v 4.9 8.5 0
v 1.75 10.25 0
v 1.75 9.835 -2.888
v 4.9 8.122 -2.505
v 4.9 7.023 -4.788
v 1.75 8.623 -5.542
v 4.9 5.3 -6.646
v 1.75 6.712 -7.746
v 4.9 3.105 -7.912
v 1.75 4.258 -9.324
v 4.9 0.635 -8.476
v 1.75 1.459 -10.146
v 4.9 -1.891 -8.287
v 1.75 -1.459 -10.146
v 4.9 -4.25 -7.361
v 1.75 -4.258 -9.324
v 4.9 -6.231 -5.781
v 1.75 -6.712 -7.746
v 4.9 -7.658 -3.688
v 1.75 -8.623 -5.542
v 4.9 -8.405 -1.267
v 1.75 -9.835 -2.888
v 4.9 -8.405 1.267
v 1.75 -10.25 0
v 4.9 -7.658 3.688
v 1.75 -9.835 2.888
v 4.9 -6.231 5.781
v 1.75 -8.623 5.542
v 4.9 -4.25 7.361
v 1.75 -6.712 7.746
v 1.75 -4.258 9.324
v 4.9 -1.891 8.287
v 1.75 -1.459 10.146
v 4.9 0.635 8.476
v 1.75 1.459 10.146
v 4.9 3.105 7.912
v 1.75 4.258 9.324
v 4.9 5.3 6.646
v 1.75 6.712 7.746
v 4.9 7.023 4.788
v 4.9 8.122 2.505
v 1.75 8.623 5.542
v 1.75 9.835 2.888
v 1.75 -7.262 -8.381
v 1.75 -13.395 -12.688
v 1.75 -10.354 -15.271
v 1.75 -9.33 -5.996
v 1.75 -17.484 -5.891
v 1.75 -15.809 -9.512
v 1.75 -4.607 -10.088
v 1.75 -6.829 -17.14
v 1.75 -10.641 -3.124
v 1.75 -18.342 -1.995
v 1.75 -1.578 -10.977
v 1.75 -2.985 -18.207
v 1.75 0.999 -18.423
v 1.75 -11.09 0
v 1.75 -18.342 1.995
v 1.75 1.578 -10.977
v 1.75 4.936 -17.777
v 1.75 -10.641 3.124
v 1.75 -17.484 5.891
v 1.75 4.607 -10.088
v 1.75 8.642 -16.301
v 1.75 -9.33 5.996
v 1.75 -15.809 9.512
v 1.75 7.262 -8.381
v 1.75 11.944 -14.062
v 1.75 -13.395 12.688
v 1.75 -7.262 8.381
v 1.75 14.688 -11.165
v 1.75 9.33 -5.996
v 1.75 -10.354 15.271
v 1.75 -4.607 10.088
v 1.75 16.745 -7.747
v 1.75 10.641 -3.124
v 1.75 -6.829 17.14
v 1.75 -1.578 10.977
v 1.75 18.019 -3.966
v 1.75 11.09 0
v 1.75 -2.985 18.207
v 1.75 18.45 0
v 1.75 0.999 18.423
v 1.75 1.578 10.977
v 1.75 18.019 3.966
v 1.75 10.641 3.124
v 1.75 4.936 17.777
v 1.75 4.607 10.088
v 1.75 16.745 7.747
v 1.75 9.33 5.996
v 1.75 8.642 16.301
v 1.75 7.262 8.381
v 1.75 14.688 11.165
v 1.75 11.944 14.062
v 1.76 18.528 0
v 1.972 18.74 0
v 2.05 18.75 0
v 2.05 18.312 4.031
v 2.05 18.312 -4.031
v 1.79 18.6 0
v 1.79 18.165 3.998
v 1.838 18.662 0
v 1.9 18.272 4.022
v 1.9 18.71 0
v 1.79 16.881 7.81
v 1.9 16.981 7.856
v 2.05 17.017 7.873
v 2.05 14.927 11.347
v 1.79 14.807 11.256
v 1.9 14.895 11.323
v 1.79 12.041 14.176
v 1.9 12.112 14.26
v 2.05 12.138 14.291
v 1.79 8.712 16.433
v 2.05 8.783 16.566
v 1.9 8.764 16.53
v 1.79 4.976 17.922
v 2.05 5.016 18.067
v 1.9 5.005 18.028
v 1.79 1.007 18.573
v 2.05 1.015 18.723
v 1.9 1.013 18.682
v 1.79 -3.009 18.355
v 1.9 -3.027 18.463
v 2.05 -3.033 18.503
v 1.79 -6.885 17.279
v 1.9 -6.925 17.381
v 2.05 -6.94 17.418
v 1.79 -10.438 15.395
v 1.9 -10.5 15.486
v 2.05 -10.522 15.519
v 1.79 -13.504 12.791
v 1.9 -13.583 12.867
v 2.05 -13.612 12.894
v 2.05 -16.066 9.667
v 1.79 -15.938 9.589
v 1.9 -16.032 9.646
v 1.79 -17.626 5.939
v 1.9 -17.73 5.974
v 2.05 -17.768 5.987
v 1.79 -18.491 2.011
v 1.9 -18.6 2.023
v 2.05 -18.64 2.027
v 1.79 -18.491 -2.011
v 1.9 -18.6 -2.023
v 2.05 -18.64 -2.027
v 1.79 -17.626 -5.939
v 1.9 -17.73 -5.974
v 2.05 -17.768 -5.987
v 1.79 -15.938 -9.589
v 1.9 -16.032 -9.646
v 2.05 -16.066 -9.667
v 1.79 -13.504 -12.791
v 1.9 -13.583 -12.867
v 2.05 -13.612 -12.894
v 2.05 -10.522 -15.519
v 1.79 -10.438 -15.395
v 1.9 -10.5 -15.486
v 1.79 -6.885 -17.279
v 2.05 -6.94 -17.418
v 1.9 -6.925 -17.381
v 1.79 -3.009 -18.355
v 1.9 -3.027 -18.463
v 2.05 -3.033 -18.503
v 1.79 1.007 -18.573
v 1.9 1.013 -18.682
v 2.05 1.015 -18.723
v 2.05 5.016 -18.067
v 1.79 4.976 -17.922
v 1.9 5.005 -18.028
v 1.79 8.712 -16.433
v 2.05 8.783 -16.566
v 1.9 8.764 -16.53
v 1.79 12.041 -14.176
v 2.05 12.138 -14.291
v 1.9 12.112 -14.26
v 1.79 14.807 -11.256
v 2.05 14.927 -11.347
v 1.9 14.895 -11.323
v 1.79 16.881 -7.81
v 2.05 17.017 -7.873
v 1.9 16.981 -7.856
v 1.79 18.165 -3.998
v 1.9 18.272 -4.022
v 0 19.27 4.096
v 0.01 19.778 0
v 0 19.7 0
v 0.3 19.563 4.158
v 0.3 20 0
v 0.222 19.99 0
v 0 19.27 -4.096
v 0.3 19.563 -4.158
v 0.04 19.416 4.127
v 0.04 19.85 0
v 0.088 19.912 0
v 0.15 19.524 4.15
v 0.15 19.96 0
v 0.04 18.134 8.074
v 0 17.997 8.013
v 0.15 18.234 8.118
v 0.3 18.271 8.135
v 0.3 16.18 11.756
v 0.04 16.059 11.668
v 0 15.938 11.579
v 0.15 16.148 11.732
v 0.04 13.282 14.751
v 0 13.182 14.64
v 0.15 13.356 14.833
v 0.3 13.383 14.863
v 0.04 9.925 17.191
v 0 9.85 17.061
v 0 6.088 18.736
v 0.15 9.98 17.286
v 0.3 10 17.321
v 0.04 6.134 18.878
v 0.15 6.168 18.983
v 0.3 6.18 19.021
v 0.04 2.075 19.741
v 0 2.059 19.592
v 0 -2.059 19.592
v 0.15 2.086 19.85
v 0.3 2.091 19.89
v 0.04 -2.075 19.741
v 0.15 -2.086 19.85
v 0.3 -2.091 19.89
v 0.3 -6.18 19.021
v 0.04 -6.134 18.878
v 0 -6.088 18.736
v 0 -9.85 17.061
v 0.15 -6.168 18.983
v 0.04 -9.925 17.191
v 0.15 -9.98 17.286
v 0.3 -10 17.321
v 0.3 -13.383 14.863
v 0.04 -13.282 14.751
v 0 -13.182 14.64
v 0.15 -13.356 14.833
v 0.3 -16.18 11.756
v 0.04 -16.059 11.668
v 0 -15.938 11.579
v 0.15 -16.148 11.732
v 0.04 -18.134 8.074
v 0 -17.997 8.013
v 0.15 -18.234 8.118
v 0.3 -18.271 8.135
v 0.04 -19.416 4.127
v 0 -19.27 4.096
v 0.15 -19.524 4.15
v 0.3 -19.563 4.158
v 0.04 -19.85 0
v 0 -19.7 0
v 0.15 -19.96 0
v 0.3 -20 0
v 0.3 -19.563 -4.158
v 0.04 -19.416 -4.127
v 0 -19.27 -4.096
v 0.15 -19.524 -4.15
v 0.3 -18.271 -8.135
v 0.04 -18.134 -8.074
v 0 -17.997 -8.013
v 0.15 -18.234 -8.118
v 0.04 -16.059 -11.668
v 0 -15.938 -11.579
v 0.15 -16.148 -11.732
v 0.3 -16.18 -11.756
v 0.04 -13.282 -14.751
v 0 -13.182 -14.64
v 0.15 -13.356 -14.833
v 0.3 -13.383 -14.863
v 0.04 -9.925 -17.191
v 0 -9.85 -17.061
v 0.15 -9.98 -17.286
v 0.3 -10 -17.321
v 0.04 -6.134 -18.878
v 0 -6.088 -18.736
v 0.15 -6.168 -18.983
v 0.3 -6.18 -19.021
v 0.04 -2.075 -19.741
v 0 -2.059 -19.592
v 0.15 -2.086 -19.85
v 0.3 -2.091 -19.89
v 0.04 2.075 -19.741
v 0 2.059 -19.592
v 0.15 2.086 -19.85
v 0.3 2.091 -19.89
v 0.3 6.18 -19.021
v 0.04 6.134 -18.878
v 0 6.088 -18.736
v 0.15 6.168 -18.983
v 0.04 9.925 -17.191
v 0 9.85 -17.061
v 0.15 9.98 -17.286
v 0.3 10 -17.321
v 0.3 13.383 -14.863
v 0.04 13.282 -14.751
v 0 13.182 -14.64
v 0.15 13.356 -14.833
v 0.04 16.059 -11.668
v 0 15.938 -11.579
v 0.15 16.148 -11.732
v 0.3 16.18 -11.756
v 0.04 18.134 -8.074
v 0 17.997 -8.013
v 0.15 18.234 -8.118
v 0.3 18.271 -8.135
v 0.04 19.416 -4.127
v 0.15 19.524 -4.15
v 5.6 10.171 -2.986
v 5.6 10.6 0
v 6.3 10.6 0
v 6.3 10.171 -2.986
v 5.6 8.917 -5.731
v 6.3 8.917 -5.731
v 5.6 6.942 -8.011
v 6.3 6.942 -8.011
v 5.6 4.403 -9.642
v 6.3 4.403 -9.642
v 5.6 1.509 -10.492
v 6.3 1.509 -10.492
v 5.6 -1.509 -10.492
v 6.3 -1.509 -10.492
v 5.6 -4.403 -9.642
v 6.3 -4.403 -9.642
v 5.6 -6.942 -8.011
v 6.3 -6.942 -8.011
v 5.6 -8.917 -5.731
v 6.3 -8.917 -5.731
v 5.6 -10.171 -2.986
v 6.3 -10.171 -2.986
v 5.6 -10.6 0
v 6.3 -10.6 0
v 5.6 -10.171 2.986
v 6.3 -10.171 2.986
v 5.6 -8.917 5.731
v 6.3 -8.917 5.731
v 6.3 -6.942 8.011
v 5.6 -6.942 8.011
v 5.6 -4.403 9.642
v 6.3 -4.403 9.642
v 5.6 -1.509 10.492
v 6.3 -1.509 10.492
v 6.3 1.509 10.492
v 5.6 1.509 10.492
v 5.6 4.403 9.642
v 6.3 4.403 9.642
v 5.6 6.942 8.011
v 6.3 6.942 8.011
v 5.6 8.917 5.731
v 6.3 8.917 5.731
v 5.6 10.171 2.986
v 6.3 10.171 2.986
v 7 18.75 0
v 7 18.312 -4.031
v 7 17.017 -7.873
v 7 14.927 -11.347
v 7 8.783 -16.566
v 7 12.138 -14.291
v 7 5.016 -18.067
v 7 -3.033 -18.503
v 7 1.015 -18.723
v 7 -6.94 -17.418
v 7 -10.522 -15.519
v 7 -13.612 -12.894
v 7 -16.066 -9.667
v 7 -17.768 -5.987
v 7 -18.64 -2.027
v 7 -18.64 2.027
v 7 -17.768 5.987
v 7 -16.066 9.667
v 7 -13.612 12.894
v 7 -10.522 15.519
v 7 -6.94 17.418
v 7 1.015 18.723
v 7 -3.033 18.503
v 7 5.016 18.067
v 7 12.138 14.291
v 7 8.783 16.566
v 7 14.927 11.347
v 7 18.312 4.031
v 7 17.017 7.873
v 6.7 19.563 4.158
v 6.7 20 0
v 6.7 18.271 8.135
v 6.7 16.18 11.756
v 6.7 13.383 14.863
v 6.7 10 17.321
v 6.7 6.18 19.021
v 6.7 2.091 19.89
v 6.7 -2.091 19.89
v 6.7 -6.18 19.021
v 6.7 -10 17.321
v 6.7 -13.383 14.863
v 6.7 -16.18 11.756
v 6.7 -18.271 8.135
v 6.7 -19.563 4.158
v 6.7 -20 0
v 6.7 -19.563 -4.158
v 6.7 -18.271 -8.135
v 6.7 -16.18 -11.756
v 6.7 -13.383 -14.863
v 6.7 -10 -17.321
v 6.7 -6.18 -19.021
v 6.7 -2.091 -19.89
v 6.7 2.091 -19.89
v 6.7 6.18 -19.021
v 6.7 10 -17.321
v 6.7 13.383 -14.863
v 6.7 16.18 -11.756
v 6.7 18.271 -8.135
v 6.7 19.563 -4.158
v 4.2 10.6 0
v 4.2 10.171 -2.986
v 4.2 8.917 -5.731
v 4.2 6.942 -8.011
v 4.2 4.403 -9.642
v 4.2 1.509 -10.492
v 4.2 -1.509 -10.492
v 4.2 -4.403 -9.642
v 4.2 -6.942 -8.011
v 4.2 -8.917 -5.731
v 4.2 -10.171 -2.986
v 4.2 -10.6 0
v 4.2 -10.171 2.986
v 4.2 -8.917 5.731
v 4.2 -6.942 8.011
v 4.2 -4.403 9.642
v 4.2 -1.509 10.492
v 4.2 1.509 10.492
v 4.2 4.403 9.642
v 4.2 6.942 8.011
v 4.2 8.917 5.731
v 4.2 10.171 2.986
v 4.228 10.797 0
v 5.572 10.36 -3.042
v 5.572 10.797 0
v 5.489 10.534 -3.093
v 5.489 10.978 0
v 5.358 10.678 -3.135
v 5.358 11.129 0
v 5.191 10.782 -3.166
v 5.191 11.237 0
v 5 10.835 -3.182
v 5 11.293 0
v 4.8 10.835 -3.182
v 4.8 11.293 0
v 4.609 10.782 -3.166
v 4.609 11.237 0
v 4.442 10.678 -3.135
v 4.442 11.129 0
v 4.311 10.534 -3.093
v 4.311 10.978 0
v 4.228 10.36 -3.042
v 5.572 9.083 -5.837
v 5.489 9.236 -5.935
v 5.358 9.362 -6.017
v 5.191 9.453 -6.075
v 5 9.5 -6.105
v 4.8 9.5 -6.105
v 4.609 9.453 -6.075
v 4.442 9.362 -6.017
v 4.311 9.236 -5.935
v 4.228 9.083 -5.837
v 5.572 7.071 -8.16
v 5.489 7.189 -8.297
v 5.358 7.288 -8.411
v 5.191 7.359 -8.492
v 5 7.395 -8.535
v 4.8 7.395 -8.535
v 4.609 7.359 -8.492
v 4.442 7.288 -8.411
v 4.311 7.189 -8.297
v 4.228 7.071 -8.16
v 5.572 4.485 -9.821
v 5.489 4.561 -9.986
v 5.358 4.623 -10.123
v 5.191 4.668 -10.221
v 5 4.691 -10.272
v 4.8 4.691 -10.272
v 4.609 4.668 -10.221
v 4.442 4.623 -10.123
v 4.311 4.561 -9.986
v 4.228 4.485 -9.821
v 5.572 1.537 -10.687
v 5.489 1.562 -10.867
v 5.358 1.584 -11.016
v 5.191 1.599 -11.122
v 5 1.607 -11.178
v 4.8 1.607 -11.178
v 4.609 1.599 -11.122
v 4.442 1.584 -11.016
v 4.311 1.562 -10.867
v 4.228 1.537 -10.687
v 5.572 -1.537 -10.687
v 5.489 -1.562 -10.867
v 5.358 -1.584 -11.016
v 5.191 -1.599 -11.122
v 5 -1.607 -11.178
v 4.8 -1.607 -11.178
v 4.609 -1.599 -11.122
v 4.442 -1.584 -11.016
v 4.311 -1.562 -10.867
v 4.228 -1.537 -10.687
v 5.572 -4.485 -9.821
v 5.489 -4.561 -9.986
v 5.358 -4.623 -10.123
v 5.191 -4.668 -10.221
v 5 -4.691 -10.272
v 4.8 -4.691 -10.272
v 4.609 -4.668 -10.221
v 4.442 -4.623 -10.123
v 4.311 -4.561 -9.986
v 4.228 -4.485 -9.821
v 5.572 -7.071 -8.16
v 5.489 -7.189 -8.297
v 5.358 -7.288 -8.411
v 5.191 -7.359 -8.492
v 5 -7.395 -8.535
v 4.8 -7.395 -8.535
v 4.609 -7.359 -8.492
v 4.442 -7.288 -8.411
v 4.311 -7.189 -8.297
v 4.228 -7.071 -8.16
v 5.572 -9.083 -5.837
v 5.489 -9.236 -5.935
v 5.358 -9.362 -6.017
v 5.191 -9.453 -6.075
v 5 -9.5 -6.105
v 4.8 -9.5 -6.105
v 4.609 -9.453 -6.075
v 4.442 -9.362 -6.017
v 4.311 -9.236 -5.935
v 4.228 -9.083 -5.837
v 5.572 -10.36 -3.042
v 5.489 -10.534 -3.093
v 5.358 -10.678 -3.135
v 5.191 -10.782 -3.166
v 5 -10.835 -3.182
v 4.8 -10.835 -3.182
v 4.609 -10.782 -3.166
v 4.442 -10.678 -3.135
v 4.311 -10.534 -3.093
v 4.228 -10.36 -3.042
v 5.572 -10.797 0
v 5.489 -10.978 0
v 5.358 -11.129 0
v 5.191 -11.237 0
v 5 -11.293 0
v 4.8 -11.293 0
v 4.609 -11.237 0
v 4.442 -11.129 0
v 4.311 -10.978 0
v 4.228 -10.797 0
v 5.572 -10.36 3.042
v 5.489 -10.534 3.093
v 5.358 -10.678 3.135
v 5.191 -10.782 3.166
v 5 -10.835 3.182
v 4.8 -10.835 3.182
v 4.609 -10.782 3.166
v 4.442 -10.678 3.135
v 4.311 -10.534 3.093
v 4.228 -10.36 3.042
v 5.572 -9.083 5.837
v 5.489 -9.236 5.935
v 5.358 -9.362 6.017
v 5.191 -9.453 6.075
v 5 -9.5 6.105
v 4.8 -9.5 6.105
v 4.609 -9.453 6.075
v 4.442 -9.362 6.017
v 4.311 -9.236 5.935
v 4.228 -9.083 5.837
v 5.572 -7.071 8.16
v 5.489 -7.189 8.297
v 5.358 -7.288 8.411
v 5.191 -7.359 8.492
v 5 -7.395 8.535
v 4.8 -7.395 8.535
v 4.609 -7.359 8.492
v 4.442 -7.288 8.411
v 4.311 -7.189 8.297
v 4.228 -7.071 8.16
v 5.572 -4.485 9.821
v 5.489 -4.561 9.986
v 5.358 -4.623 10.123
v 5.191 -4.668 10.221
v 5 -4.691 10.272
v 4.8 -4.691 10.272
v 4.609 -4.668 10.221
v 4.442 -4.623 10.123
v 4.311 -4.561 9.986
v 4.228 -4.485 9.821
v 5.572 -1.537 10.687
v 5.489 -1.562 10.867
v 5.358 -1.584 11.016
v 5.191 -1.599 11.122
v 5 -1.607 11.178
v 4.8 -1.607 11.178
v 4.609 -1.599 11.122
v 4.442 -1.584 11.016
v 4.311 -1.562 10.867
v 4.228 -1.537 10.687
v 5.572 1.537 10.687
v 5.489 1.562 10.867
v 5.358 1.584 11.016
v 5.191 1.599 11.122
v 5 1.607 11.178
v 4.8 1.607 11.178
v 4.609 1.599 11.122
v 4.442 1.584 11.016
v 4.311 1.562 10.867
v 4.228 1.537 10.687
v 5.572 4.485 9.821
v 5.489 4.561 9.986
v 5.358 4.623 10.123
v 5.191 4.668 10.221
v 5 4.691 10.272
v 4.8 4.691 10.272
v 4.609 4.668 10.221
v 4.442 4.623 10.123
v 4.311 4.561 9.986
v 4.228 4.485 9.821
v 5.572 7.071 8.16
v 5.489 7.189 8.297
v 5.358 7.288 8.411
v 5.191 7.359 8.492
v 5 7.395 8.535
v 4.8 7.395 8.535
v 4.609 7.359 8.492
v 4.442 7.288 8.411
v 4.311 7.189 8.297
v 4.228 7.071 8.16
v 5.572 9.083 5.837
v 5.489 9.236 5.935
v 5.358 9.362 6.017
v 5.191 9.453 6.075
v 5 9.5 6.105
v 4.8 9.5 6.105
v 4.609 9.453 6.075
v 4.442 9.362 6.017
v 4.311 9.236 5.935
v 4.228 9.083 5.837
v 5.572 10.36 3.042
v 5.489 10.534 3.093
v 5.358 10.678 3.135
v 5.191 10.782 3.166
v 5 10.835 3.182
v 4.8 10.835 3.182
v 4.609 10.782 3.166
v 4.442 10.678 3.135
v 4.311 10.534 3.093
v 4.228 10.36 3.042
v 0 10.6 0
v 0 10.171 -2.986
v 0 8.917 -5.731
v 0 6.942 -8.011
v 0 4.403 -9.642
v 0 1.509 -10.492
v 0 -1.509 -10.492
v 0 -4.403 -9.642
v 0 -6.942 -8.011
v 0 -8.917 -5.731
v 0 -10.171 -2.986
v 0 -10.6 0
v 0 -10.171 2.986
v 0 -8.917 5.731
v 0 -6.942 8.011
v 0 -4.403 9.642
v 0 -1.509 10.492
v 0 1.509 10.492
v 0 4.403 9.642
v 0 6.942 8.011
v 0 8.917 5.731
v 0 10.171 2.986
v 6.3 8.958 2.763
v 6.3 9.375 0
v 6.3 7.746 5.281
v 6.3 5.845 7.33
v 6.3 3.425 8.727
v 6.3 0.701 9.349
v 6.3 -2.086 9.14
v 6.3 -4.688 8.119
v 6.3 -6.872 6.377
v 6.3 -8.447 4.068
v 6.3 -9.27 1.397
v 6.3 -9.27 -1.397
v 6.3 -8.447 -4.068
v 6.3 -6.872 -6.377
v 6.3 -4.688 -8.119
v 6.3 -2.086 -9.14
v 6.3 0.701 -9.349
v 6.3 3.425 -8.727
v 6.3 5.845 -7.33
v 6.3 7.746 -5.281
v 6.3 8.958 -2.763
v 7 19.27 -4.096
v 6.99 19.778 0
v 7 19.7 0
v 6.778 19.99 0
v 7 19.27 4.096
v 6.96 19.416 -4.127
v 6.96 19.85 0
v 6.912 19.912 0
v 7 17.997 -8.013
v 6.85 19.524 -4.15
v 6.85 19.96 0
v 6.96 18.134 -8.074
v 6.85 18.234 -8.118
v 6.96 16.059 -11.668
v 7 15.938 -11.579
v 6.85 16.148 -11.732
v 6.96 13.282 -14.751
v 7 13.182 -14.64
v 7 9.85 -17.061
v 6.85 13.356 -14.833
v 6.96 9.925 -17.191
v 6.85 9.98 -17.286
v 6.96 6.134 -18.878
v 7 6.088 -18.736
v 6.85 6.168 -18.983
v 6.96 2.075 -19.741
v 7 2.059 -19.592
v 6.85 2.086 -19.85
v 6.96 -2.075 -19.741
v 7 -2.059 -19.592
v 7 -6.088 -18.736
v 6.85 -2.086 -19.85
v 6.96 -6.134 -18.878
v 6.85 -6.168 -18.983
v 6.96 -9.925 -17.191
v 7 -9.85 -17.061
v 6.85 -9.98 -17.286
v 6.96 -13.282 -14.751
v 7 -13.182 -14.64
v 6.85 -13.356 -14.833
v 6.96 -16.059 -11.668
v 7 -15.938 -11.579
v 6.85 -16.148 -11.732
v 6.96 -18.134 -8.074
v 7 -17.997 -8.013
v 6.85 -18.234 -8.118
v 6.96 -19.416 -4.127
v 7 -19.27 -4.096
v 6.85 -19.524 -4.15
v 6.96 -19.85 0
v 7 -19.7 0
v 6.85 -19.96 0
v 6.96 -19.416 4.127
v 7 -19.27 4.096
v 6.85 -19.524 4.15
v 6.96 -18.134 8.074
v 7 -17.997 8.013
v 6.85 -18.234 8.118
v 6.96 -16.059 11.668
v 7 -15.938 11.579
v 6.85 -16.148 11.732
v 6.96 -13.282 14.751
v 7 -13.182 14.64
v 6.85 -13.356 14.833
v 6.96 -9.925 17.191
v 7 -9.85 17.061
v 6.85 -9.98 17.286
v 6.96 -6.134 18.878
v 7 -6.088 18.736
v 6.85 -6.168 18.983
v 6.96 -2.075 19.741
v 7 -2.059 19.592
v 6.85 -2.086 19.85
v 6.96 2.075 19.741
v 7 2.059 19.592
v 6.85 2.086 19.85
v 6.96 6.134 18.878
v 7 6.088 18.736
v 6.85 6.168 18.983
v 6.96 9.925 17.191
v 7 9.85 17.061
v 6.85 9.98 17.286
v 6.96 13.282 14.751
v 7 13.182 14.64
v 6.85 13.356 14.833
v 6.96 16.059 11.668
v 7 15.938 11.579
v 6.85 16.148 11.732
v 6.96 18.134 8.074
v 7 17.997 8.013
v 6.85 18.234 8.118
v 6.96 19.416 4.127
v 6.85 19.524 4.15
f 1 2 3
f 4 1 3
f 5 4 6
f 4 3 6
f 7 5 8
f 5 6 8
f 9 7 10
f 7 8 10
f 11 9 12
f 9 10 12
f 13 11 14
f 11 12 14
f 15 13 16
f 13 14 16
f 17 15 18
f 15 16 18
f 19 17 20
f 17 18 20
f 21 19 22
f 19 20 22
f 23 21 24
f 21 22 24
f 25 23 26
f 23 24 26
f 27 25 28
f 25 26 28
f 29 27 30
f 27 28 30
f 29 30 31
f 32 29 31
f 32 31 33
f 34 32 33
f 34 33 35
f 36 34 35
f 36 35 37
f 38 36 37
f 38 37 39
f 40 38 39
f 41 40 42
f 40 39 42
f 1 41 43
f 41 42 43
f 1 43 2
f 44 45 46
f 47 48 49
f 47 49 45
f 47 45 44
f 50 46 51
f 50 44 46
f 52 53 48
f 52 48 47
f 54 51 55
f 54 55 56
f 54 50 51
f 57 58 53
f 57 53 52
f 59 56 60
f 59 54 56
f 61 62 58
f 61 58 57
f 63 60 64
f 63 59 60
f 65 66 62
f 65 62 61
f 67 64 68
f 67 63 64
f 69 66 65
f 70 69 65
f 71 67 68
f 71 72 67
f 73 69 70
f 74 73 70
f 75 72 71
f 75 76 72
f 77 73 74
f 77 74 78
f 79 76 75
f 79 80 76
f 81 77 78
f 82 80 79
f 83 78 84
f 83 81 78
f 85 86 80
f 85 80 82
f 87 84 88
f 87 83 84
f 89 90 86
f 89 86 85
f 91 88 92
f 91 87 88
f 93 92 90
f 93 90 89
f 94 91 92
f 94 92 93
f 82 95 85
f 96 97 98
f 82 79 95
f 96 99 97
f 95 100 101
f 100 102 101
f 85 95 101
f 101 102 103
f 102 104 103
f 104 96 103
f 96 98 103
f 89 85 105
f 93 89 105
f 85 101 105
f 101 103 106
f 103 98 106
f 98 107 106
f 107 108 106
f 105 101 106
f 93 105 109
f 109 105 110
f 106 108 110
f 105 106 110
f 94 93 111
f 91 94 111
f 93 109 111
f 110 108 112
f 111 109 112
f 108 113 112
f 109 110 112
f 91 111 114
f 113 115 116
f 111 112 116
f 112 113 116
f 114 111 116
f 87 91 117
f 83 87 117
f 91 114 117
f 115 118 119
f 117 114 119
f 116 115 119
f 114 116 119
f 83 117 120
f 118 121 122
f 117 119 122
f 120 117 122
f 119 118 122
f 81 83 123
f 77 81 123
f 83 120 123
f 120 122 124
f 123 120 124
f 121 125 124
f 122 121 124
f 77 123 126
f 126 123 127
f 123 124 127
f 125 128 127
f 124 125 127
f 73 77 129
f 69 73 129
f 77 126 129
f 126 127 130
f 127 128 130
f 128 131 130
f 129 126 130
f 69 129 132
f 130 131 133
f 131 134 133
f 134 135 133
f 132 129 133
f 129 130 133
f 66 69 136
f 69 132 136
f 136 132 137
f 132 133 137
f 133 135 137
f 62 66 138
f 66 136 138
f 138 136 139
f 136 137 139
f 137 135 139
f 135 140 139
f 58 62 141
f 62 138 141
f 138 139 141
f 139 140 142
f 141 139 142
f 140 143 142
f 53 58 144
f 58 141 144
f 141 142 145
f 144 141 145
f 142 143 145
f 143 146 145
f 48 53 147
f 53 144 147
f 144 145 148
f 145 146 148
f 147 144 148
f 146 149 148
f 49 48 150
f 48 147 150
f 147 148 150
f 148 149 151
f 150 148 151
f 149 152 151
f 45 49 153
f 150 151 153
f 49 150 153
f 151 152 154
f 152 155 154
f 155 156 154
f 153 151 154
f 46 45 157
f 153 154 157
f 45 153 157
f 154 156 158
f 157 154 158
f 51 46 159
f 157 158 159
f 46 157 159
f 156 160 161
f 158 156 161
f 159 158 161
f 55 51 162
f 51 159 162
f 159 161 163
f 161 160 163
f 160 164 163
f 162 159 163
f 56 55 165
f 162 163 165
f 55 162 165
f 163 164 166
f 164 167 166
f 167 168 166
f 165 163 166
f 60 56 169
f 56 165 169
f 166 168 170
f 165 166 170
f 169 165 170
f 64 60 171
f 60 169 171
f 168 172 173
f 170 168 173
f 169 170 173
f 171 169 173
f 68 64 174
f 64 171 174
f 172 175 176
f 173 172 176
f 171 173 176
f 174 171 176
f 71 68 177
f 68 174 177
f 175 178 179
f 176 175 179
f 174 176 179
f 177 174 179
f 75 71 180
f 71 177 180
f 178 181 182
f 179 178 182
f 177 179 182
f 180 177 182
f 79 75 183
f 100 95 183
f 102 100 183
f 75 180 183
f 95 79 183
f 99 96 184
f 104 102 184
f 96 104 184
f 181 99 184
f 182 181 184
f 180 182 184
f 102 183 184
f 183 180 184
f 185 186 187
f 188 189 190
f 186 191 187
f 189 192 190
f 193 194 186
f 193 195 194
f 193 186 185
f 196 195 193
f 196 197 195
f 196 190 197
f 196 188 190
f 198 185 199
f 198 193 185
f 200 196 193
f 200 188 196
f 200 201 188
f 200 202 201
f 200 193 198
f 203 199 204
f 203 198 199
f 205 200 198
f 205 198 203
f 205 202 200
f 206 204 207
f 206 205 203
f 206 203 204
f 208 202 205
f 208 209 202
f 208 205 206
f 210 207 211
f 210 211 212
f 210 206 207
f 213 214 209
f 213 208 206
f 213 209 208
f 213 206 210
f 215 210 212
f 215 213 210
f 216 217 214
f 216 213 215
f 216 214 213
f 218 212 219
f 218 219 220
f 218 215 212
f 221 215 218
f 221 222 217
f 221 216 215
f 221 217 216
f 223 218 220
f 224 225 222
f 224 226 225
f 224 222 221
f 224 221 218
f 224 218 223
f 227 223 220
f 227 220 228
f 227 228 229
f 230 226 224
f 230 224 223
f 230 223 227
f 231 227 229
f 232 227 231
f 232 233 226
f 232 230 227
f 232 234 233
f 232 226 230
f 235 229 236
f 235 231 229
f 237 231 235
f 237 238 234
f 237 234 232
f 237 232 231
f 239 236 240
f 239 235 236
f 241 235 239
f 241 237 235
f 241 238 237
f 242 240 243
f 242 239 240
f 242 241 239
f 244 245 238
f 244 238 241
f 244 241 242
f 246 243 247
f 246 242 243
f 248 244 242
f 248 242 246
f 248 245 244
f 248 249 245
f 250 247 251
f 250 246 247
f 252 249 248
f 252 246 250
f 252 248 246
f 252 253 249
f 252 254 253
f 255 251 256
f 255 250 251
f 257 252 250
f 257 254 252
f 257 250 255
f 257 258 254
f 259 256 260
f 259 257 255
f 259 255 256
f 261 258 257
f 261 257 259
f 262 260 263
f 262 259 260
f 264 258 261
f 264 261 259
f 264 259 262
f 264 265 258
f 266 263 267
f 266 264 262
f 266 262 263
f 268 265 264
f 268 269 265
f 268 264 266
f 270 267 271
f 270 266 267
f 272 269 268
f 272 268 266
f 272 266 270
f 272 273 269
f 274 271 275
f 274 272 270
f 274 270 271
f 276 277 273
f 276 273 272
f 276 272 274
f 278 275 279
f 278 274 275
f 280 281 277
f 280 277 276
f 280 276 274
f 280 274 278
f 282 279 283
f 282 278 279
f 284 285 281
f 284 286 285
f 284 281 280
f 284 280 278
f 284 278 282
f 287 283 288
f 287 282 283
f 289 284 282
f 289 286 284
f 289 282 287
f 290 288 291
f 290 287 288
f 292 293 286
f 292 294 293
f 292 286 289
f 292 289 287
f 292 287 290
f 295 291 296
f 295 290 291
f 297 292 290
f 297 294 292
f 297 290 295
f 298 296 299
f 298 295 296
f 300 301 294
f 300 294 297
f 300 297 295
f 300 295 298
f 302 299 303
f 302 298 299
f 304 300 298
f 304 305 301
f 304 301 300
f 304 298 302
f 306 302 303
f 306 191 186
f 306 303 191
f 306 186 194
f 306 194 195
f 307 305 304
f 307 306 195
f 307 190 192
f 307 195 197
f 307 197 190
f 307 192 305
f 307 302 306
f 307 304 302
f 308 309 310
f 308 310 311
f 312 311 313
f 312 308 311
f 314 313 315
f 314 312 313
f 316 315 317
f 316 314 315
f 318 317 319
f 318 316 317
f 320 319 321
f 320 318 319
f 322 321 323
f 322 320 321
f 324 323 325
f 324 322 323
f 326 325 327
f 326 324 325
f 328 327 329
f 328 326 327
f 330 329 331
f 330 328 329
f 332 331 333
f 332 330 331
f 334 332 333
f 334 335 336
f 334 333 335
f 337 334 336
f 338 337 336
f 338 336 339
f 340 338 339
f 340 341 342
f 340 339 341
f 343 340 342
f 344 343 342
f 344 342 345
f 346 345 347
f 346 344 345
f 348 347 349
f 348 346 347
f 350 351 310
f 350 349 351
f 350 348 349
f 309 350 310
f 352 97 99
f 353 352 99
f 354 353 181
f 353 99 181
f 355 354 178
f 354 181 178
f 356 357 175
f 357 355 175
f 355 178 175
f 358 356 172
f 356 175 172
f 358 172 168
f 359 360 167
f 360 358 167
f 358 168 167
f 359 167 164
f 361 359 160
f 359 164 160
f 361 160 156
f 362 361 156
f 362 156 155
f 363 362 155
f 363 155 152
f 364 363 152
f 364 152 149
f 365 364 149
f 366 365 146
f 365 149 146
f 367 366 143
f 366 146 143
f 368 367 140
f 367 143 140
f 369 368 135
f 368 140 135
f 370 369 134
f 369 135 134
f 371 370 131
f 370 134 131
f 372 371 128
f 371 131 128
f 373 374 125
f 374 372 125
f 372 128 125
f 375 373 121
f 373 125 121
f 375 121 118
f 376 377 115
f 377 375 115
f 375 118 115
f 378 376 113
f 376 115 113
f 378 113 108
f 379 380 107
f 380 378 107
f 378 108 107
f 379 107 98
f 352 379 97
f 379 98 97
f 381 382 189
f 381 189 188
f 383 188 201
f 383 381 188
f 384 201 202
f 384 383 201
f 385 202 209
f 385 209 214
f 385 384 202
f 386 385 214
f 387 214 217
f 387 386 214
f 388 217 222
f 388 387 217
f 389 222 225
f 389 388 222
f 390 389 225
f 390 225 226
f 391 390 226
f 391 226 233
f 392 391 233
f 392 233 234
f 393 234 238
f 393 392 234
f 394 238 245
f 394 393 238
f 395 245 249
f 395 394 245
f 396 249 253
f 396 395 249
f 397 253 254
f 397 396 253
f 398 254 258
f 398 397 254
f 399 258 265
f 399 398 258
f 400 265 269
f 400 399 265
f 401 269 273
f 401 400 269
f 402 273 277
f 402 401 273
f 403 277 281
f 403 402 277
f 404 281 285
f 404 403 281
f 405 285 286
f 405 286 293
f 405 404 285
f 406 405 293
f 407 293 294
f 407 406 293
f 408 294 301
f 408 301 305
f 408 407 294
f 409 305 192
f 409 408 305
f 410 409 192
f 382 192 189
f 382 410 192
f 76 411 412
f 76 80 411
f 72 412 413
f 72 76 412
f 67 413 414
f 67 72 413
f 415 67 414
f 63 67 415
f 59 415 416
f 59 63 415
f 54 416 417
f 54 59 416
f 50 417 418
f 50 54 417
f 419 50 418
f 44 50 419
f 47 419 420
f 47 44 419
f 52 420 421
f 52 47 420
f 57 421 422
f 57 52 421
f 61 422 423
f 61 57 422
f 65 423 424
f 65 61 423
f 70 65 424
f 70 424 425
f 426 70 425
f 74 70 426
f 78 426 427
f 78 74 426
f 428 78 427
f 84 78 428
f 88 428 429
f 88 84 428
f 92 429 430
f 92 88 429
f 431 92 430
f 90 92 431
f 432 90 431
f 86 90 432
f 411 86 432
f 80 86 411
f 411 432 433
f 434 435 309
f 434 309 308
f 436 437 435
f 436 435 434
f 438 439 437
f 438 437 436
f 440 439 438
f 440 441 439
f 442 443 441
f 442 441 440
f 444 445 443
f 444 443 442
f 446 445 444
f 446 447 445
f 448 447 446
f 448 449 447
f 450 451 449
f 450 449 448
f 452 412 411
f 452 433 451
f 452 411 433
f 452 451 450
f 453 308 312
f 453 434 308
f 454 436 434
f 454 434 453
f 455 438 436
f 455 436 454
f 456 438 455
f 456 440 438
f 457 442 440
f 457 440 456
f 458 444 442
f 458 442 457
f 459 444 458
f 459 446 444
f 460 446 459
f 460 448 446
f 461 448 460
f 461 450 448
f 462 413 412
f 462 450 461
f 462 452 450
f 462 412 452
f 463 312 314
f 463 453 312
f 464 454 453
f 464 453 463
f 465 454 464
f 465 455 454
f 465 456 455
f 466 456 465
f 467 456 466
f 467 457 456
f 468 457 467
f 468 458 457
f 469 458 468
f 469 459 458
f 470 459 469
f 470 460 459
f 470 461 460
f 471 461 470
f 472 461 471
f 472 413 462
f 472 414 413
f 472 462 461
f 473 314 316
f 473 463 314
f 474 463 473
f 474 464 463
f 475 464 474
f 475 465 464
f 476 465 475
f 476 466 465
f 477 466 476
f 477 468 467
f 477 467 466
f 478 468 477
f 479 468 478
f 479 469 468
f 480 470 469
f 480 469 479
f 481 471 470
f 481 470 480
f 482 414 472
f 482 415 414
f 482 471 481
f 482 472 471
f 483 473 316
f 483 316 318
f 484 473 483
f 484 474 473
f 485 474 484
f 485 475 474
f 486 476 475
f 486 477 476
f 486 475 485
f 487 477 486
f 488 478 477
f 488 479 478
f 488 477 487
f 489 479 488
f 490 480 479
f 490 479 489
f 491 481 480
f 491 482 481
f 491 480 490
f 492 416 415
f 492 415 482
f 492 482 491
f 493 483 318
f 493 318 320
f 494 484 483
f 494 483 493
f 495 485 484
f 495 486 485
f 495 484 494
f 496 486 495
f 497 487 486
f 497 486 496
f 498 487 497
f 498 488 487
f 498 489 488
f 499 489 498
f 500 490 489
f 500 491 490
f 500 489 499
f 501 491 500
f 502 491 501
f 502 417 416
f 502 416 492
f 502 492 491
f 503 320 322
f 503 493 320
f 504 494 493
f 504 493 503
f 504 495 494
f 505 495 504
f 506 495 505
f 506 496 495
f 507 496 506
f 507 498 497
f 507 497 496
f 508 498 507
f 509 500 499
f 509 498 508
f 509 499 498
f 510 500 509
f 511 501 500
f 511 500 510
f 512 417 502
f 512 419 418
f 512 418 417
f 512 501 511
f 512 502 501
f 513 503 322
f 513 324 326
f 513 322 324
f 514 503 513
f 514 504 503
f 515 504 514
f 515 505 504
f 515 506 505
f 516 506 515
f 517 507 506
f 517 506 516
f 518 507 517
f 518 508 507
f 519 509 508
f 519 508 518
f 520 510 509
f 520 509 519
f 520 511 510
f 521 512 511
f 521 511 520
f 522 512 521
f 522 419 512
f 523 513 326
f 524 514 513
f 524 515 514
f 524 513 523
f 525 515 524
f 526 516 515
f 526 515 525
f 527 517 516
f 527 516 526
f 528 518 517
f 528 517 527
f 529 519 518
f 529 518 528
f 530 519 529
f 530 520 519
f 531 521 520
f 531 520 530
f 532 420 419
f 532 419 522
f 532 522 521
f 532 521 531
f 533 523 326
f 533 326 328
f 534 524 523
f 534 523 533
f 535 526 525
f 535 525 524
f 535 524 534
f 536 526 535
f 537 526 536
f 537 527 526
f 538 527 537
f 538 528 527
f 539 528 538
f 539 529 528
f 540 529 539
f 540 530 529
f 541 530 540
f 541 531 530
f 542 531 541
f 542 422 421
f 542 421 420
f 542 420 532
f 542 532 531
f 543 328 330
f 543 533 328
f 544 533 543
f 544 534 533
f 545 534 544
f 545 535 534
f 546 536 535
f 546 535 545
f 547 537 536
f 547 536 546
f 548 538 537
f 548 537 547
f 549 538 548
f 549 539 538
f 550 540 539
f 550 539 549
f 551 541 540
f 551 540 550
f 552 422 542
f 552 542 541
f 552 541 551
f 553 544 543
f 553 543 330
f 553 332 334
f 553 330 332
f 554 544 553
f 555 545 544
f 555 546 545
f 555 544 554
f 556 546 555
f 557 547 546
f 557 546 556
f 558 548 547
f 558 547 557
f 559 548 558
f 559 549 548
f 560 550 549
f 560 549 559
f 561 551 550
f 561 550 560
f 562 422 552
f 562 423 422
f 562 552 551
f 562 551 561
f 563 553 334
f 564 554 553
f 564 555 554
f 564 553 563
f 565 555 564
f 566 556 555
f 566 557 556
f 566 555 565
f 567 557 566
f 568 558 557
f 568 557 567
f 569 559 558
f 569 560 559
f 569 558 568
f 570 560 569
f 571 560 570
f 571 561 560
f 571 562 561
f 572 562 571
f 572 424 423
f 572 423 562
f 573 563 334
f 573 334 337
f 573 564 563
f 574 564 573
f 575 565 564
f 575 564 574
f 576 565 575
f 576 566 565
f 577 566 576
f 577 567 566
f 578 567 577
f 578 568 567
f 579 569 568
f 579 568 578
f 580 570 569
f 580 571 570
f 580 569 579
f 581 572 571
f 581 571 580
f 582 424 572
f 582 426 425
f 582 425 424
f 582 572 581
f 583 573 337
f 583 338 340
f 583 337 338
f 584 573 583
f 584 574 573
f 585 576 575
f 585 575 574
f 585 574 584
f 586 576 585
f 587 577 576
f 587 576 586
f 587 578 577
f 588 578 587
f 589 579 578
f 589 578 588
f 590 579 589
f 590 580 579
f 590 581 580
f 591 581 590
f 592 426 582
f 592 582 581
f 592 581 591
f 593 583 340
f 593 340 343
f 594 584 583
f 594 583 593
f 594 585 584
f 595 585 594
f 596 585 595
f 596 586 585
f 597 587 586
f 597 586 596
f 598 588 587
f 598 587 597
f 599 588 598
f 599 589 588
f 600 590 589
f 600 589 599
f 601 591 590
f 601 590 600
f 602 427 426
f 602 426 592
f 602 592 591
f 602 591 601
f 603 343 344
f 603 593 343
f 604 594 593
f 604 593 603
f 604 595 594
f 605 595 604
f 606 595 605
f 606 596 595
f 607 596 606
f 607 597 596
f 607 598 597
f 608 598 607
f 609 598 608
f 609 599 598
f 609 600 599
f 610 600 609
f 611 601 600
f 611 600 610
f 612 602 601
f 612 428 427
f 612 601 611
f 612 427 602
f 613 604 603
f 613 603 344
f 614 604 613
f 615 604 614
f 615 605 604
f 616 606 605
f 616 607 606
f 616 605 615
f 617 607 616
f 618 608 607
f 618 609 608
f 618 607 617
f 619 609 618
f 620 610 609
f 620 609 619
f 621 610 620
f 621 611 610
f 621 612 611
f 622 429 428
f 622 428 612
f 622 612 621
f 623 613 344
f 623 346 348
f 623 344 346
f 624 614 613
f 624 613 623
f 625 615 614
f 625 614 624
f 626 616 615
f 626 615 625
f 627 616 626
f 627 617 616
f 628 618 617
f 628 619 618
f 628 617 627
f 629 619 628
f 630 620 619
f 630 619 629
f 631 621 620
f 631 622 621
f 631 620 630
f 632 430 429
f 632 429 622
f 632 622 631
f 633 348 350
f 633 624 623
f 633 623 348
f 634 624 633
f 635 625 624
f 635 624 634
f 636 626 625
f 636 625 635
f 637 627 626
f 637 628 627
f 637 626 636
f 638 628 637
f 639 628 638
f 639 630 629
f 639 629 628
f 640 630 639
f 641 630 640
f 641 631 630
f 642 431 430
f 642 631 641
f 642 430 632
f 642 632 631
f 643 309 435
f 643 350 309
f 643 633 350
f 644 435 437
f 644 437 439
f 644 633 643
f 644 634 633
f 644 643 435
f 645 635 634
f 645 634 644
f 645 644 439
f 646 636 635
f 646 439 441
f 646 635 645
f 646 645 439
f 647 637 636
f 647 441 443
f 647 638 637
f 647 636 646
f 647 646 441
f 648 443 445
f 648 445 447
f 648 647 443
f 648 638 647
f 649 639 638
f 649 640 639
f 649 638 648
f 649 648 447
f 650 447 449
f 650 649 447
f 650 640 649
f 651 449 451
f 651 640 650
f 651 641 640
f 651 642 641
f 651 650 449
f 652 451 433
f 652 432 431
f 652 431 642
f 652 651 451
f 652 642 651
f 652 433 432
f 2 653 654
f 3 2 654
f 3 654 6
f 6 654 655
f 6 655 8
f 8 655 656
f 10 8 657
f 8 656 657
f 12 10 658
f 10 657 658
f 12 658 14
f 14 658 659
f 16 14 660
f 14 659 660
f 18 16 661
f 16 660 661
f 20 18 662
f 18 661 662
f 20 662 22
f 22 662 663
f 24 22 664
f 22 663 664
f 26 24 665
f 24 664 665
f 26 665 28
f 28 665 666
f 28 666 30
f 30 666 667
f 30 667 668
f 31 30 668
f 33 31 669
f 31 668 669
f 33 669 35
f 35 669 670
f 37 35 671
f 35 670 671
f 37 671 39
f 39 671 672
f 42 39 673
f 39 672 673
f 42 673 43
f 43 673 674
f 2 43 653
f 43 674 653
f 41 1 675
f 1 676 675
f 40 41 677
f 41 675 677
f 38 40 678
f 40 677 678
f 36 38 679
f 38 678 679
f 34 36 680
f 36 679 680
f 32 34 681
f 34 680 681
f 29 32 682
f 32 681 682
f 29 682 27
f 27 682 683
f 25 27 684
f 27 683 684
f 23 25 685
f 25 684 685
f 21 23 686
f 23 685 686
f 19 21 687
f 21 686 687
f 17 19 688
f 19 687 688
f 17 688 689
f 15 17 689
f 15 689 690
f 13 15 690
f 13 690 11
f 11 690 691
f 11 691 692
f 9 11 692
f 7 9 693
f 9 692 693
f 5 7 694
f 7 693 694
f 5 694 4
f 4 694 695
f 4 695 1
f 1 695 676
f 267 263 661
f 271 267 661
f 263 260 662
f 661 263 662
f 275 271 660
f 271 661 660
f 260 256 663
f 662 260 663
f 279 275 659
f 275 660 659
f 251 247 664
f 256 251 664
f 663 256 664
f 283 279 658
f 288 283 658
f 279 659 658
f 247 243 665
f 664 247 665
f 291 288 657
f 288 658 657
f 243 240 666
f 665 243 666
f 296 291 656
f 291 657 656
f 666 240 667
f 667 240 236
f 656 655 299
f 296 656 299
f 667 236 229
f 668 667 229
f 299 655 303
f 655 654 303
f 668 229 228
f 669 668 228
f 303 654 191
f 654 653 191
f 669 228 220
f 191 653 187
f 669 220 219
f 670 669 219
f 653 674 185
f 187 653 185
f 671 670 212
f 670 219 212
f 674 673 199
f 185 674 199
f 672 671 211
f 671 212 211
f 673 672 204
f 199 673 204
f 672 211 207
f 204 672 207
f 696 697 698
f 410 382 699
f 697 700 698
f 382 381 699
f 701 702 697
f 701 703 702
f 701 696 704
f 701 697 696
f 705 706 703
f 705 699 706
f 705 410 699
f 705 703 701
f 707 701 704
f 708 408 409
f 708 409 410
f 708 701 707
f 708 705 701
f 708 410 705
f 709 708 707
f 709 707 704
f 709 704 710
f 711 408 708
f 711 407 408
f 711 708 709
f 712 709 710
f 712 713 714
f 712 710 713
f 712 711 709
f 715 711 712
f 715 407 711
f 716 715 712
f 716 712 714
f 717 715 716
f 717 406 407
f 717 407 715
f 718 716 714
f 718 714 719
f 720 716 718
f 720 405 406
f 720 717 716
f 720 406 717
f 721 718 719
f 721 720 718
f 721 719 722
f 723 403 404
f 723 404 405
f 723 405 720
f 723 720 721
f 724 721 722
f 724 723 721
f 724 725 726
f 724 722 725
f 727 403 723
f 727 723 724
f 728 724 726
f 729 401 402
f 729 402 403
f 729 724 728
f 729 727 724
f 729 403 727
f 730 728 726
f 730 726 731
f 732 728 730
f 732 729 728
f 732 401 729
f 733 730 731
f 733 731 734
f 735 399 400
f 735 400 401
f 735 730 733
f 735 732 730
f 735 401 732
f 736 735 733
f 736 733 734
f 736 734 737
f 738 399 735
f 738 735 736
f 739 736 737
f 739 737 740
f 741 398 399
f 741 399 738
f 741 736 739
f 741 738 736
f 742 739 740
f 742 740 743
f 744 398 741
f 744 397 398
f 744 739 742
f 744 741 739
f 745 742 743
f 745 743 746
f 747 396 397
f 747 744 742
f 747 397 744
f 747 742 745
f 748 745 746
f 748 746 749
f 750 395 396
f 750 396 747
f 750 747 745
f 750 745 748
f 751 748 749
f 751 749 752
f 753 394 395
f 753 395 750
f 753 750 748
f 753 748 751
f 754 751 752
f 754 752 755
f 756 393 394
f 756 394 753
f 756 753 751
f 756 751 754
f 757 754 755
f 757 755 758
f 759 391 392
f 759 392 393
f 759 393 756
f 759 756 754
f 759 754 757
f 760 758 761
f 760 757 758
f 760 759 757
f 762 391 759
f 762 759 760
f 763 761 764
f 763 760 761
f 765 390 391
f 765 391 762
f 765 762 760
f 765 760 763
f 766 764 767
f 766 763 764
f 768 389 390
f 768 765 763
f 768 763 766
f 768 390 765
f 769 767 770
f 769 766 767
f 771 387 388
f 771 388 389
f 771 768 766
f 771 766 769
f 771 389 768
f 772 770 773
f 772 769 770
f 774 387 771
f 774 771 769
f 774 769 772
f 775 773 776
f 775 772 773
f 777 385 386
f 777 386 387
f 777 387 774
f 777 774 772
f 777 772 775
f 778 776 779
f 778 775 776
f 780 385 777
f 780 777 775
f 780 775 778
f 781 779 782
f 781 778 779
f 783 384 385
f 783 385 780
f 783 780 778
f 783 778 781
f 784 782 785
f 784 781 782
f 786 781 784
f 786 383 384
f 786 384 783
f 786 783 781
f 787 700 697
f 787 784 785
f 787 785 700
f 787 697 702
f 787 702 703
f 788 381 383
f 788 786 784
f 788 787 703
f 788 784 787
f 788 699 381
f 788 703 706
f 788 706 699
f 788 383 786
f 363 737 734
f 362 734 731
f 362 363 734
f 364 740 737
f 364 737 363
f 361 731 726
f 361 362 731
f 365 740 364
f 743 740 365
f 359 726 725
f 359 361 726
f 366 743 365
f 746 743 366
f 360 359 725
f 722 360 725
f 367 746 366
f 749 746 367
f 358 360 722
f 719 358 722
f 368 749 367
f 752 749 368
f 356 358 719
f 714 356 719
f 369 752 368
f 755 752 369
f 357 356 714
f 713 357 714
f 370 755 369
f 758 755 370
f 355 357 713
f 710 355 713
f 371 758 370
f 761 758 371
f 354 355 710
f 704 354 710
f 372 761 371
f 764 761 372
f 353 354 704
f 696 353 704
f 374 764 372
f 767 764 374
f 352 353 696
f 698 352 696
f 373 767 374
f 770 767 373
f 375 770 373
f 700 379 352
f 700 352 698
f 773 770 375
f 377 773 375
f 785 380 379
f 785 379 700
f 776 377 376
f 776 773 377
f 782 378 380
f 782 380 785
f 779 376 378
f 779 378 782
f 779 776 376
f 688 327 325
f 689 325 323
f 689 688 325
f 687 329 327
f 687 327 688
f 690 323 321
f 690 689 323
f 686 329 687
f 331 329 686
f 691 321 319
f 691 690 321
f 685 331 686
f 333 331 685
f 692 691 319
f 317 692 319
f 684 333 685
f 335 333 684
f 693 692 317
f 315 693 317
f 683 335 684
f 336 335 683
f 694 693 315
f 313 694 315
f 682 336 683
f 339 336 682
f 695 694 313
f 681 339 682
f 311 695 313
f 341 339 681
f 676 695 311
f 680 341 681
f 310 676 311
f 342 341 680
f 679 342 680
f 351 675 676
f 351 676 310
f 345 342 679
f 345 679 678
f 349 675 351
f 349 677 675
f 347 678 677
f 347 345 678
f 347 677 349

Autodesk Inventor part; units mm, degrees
ref_plane "YZ Plane" through (0, 0, 0) normal (1, 0, 0) x (0, 1, 0)
ref_plane "XZ Plane" through (0, 0, 0) normal (0, 1, 0) x (-1, 0, 0)
ref_plane "XY Plane" through (0, 0, 0) normal (0, 0, 1) x (1, 0, 0)
sketch "Sketch1" plane through (0, 0, 0) normal (0, 0, 1) x (1, 0, 0)
  circle A0 centre (4.9, 10.6) radius 0.455
  circle A1 centre (4.9, 10.6) radius 0.7
  line L0 (6.3, 9.375) -> (6.3, 10.6)
  line L1 (0, 20) -> (7, 20)
  line L2 (7, 20) -> (7, 18.75)
  line L3 (7, 18.75) -> (1.75, 18.75)
  line L4 (0, 0) -> (9.5856, 0)
  line L5 (0, 20) -> (0, 10.6)
  line L6 (0, 10.6) -> (1.75, 10.25)
  line L7 (1.75, 10.25) -> (4.9, 8.5)
  line L8 (4.9, 8.5) -> (6.3, 9.375)
  line L9 (4.9, 8.5) -> (0, 8.5) construction
  line L10 (0, 18) -> (0, -3) projected
  line L11 (-1.9171, 0) -> (11.5027, 0) projected
  line L12 (4.2, 10.6) -> (1.75, 11.09)
  line L13 (1.75, 11.09) -> (1.75, 18.75)
  line L14 (6.3, 10.6) -> (5.6, 10.6)
  dimension "d0" = 40
  dimension "d1" = 18.75
  dimension "d2" = 1.25
  dimension "d3" = 0.91
  dimension "d4" = 1.4
  dimension "d5" = 17
  dimension "d6" = 20.5
  dimension "d7" = 21.2
  dimension "d8" = 4.9
  dimension "d9" = 6.3
  dimension "d10" = 7
  dimension "d12" = 1.75
revolve "Body" add sketch "Sketch1" angle 360 about axis through (0, 0, 0) along (1, 0, 0) contours L14 L0 L8 L7 L6 L5 L1 L2 L3 L13 L12 A1
revolve "Spring1" add sketch "Sketch1" angle 360 about axis through (0, 0, 0) along (1, 0, 0) contours A0 | A1
fillet "Fillet1" radius 0.3 3 edges at (7, -20, 0) (1.75, -18.75, 0) (0, -20, 0)
equation "\"d0\" = SD2"
equation "\"d1\" = ABDM"
equation "\"d3\" = SPDI"
equation "\"d4\" = SPDA"
equation "\"d5\" = NND"
equation "\"d6\" = TKDM"
equation "\"d7\" = HLDM"
equation "\"d8\" = SPDST"
equation "\"d9\" = SDI"
equation "\"d10\" = SWDT"
equation "\"d12\" = SD"
equation "\"d11\" = RR"
equation "\"SD2\" = 40"
equation "\"SWDT\" = 7"
equation "\"RR\" = 0.3"
equation "\"SD\" = 1.75"
equation "\"NND\" = 17"
equation "\"SPDA\" = 1.4"
equation "\"SPDI\" = 0.91"
equation "\"TKDM\" = 20.5"
equation "\"HLDM\" = 21.2"
equation "\"ABDM\" = 18.75"
equation "\"SDI\" = 6.3"
equation "\"SPDST\" = 4.9"
equation "\"LAB\" = 0.35"
properties part number "CSN 02 9401 - G 17x40x7 - NBR" material "Rubber"
